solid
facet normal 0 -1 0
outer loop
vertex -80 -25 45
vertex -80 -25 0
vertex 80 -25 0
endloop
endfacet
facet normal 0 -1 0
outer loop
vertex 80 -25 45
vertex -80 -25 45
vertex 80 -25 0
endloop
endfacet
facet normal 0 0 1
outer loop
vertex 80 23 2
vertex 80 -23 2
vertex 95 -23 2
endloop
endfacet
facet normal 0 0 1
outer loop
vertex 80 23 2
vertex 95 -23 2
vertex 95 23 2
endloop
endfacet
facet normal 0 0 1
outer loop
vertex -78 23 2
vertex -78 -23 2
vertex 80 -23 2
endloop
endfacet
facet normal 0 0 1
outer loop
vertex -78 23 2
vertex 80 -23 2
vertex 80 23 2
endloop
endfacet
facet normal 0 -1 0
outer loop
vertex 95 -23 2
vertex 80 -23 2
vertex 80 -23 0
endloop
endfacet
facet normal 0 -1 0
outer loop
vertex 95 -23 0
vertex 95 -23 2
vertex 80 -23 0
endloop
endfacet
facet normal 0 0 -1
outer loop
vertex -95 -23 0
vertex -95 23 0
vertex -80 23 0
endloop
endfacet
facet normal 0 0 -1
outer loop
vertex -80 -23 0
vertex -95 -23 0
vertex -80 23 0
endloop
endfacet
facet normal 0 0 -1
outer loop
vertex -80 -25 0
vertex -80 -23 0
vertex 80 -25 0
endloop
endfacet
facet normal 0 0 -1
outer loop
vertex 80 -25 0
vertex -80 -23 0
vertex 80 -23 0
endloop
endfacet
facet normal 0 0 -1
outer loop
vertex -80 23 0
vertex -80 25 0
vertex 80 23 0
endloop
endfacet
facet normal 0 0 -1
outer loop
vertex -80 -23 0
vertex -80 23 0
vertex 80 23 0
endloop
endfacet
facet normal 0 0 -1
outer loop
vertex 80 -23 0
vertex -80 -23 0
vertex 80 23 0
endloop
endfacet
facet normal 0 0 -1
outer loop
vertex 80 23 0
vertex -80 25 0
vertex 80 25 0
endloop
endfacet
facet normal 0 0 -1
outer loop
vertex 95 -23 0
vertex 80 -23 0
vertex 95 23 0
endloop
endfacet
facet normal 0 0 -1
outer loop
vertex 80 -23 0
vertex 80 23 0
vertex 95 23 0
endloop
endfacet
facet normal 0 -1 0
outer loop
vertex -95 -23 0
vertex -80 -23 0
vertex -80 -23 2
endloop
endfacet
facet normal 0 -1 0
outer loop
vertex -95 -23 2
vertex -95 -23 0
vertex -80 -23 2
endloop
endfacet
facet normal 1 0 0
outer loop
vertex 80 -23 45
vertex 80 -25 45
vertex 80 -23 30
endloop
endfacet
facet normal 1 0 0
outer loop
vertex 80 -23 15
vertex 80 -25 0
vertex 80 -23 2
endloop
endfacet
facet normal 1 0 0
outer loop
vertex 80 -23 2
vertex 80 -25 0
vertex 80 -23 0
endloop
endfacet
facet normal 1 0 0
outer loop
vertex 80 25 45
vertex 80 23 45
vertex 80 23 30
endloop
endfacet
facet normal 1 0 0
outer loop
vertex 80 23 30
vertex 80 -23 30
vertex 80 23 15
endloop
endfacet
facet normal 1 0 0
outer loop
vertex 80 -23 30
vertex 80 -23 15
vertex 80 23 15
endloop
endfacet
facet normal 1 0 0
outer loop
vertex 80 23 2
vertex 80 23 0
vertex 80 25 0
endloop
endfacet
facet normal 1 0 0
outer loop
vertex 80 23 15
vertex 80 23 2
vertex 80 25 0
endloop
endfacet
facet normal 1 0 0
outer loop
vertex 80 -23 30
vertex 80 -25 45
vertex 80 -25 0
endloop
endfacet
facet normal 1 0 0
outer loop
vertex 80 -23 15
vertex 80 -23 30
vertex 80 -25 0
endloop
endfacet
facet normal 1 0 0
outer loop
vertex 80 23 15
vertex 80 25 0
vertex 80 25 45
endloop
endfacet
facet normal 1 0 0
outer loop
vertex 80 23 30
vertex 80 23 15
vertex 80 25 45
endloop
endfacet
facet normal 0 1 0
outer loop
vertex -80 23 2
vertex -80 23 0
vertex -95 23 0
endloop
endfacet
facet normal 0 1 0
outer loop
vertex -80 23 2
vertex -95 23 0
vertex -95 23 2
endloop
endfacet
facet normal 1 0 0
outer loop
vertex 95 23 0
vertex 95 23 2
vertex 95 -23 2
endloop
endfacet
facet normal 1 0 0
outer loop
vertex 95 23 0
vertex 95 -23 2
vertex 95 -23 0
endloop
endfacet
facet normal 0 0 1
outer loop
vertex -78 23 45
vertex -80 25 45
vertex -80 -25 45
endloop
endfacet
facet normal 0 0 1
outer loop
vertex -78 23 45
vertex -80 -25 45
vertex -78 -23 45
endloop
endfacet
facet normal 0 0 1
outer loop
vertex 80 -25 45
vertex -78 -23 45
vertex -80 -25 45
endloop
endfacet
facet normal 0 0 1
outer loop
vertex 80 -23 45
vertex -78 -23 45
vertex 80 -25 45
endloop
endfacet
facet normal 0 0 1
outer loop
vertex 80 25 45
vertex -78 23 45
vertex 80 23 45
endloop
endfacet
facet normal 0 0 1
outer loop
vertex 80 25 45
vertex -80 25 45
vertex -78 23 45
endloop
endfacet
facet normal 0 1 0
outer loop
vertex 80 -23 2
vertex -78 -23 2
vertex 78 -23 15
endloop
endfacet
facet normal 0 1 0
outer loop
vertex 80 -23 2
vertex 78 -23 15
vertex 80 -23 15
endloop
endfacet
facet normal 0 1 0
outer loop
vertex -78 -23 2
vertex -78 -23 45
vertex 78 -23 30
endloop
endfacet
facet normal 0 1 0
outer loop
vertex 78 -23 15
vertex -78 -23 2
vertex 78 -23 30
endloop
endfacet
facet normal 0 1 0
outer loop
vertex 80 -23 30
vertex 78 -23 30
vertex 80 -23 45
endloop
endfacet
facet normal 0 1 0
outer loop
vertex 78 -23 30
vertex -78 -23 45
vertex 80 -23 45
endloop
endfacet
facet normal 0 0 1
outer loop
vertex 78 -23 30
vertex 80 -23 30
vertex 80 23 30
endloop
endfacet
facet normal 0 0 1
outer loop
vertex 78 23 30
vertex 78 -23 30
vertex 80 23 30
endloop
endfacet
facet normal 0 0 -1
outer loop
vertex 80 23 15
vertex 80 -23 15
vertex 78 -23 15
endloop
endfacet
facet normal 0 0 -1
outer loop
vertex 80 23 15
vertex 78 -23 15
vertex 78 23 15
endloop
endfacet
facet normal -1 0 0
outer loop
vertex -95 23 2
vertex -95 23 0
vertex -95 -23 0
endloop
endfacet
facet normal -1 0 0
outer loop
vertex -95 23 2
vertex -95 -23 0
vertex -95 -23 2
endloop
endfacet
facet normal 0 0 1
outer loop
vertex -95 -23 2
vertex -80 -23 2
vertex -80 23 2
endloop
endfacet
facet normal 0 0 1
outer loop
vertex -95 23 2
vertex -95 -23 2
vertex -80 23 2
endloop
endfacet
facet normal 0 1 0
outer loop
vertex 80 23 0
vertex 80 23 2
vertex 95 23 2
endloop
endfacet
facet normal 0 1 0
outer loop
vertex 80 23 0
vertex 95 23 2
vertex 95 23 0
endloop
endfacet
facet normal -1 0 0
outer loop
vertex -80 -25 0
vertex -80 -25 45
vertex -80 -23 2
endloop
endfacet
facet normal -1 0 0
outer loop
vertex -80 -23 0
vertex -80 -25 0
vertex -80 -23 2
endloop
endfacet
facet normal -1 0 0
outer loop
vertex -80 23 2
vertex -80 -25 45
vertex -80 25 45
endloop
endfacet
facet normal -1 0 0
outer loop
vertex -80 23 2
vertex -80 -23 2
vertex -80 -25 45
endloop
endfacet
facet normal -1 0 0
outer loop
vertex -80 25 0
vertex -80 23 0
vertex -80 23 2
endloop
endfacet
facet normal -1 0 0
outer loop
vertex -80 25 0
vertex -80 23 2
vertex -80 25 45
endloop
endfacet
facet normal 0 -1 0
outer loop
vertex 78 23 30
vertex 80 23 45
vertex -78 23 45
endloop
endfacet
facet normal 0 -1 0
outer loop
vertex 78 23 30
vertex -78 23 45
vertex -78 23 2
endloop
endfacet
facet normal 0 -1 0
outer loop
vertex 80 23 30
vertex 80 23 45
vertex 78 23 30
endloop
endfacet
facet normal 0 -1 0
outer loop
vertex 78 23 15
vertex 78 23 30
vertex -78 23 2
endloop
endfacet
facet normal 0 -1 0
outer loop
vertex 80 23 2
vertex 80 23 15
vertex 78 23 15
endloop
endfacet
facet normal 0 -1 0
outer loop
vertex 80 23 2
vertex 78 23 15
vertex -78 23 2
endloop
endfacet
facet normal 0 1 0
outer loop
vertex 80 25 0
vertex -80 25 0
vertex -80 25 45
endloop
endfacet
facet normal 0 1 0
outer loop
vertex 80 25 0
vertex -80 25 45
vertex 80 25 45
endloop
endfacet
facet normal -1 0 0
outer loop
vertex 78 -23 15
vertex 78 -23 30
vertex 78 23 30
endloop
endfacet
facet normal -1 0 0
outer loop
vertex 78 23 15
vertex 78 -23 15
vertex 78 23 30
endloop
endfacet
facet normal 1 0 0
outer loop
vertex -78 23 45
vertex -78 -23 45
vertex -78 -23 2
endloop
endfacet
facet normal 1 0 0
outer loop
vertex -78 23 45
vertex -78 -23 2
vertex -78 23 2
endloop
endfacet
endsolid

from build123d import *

# Parameters (mm, degrees)
ESBO_O1_W                = 160
ESBO_O1_H                = 50
RESSALTO_EXTRUS_O1_DEPTH = 45
ESBO_O3_W                = 2
ESBO_O3_H                = 46
RESSALTO_EXTRUS_O2_DEPTH = 15
ESBO_O9_W                = 156
ESBO_O9_H                = 46
CORTE_EXTRUS_O2_DEPTH    = 43
CORTE_EXTRUS_O3_REACH    = 162
ESBO_O10_W               = 15
ESBO_O10_H               = 46
ESBO_O10_W_2             = 13
ESBO_O11_W               = 2
ESBO_O11_H               = 46
RESSALTO_EXTRUS_O6_DEPTH = 15


with BuildPart() as part:
    # Esboço1 → Ressalto-extrusão1 (new body)
    with BuildSketch(Plane.XY):
        Rectangle(ESBO_O1_W, ESBO_O1_H)
    extrude(amount=RESSALTO_EXTRUS_O1_DEPTH)

    # Esboço3 → Ressalto-extrusão2 (add)
    with BuildSketch(Plane(origin=(80, 0, 0), x_dir=(0, 0, -1), z_dir=(1, 0, 0))):
        with Locations((-1, 0)):
            Rectangle(ESBO_O3_W, ESBO_O3_H)
    extrude(amount=RESSALTO_EXTRUS_O2_DEPTH)

    # Esboço9 → Corte-extrusão2 (cut)
    with BuildSketch(Plane.XY.offset(45)):
        Rectangle(ESBO_O9_W, ESBO_O9_H)
    extrude(amount=-CORTE_EXTRUS_O2_DEPTH, mode=Mode.SUBTRACT)

    # Esboço10 → Corte-extrusão3 (cut, up to next)
    with BuildSketch(Plane(origin=(80, 0, 0), x_dir=(0, 0, -1), z_dir=(1, 0, 0)), mode=Mode.PRIVATE) as corte_extrus_o3_sk1:
        with Locations((-37.5, 0)):
            Rectangle(ESBO_O10_W, ESBO_O10_H)
    corte_extrus_o3_tool1 = extrude(corte_extrus_o3_sk1.sketch, amount=-CORTE_EXTRUS_O3_REACH, mode=Mode.PRIVATE) & part.part
    add(corte_extrus_o3_tool1.solids().sort_by_distance((80, 0, 37.5))[0], mode=Mode.SUBTRACT)
    # Esboço10 → Corte-extrusão3 (cut, up to next)
    with BuildSketch(Plane(origin=(80, 0, 0), x_dir=(0, 0, -1), z_dir=(1, 0, 0)), mode=Mode.PRIVATE) as corte_extrus_o3_sk2:
        with Locations((-8.5, 0)):
            Rectangle(ESBO_O10_W_2, ESBO_O10_H)
    corte_extrus_o3_tool2 = extrude(corte_extrus_o3_sk2.sketch, amount=-CORTE_EXTRUS_O3_REACH, mode=Mode.PRIVATE) & part.part
    add(corte_extrus_o3_tool2.solids().sort_by_distance((80, 0, 8.5))[0], mode=Mode.SUBTRACT)

    # Esboço11 → Ressalto-extrusão6 (add)
    with BuildSketch(Plane.ZY.offset(80)):
        with Locations((1, 0)):
            Rectangle(ESBO_O11_W, ESBO_O11_H)
    extrude(amount=RESSALTO_EXTRUS_O6_DEPTH)


solid = part.part
